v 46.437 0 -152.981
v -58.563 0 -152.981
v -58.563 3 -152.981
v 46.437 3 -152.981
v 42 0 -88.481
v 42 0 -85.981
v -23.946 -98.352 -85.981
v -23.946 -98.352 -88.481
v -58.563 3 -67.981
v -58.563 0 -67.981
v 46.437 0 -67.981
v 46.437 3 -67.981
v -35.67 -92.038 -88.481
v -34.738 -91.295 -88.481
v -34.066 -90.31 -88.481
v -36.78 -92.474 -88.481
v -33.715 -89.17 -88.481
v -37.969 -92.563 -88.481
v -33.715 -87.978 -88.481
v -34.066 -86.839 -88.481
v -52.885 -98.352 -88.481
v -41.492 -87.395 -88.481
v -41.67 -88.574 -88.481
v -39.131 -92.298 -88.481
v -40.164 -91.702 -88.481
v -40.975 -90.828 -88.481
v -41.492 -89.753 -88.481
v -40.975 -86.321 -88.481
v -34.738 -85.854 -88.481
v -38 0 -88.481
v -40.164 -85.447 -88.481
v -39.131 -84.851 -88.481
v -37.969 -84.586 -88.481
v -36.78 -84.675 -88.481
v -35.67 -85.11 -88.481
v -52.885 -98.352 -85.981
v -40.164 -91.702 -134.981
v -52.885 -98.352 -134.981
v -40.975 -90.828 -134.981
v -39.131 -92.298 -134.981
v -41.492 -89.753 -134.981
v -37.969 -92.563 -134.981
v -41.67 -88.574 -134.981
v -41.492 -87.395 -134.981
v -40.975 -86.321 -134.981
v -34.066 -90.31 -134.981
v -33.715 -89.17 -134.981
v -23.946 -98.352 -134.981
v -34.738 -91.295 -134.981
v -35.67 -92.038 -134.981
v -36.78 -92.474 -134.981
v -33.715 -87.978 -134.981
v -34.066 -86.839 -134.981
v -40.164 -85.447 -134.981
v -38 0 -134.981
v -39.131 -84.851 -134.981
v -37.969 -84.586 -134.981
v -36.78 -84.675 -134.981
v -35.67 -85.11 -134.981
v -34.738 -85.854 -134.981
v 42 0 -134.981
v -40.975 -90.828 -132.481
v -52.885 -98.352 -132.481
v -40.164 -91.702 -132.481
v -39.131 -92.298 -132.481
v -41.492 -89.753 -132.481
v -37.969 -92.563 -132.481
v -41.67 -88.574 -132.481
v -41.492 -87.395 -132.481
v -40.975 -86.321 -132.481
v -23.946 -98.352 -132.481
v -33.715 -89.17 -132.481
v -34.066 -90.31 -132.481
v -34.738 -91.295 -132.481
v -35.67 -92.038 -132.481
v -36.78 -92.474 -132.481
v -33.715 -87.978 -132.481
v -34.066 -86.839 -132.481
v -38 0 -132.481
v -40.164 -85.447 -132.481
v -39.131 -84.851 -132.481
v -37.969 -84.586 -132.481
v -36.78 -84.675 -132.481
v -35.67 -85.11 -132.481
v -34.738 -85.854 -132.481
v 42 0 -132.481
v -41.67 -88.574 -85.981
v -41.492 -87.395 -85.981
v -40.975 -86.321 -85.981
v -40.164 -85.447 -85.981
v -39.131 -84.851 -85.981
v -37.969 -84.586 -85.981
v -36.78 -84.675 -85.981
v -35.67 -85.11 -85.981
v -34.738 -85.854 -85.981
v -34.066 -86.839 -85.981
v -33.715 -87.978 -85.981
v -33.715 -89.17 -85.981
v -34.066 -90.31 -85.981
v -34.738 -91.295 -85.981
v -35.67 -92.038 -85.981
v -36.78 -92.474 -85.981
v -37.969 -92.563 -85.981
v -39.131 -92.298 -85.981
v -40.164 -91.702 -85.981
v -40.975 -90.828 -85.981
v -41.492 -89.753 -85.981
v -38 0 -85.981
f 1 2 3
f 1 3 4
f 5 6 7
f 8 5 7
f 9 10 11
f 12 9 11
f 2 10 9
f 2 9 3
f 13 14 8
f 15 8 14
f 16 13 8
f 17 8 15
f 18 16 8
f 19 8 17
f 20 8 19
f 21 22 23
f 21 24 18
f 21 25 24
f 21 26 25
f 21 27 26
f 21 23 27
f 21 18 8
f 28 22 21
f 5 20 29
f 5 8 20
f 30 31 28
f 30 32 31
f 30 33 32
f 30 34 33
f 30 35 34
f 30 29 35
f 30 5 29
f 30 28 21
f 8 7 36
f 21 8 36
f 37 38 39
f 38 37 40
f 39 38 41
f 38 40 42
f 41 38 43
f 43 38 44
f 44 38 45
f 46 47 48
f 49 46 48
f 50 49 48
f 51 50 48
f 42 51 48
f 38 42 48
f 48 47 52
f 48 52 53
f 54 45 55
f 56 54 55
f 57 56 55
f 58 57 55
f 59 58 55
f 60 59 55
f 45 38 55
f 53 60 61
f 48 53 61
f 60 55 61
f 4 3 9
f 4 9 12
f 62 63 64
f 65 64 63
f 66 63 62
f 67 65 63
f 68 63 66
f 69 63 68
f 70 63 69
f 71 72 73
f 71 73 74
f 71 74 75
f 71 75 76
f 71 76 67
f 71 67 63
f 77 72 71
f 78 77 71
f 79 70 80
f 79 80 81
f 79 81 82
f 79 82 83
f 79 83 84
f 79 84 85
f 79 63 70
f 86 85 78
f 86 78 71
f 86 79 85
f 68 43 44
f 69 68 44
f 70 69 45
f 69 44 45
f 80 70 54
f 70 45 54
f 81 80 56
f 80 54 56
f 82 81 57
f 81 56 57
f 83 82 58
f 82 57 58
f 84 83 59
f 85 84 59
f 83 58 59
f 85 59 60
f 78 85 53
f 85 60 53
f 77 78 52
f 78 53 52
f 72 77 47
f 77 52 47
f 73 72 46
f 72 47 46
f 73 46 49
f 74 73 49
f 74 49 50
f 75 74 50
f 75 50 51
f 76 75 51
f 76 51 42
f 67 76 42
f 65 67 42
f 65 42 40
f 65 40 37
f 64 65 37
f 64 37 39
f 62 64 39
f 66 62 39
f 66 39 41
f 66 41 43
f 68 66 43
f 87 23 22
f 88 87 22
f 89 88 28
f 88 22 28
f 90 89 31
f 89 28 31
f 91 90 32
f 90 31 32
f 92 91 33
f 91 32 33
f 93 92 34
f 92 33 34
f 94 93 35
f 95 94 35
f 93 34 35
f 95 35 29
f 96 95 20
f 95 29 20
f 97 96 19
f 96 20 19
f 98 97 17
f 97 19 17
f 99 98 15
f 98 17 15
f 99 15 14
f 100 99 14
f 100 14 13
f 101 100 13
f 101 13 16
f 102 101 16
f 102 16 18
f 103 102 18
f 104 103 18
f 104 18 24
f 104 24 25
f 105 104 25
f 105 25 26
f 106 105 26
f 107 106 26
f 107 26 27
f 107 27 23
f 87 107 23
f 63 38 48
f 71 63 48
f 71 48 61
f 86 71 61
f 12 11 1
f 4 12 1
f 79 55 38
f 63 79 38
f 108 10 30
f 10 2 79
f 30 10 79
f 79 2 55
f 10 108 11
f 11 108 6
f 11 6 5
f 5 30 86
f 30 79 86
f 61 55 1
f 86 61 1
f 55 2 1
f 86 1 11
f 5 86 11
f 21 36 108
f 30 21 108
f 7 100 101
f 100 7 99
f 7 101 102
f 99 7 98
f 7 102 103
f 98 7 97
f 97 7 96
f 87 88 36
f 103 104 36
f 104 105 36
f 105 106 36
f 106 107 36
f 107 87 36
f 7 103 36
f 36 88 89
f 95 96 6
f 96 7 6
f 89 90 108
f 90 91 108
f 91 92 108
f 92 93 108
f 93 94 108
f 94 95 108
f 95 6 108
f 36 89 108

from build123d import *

# Parameters (mm, degrees)
SKETCH1_W           = 105
SKETCH1_H           = 85
BOSS_EXTRUDE1_DEPTH = 3
BOSS_EXTRUDE3_DEPTH = 2.5
BOSS_EXTRUDE2_DEPTH = 2.5
SKETCH4_R           = 4
CUT_EXTRUDE1_DEPTH  = 133.63411713


with BuildPart() as part:
    # Sketch1 → Boss-Extrude1 (new body)
    with BuildSketch(Plane(origin=(0, 0, 0), x_dir=(1, 0, 0), z_dir=(0, 1, 0))):
        with Locations((-6.063023564, 110.481367852)):
            Rectangle(SKETCH1_W, SKETCH1_H)
    extrude(amount=BOSS_EXTRUDE1_DEPTH)

    # Sketch3 → Boss-Extrude3 (add)
    with BuildSketch(Plane.XY.offset(-85.981367852)):
        Polygon((-38, 0), (42, 0), (-23.946113063, -98.352332448), (-52.884605872, -98.352332448), align=None)
    extrude(amount=-BOSS_EXTRUDE3_DEPTH)

    # Sketch2 → Boss-Extrude2 (add)
    with BuildSketch(Plane(origin=(0, 0, -134.981367852), x_dir=(-1, 0, 0), z_dir=(0, 0, -1))):
        Polygon((38, 0), (52.884605872, -98.352332448), (23.946113063, -98.352332448), (-42, 0), align=None)
    extrude(amount=-BOSS_EXTRUDE2_DEPTH)

    # Sketch4 → Cut-Extrude1 (cut, through all)
    with BuildSketch(Plane(origin=(0, 0, -134.981367852), x_dir=(-1, 0, 0), z_dir=(0, 0, -1))):
        with Locations((37.669993982, -88.574319881)):
            Circle(SKETCH4_R)
    extrude(amount=-CUT_EXTRUDE1_DEPTH, mode=Mode.SUBTRACT)


solid = part.part
